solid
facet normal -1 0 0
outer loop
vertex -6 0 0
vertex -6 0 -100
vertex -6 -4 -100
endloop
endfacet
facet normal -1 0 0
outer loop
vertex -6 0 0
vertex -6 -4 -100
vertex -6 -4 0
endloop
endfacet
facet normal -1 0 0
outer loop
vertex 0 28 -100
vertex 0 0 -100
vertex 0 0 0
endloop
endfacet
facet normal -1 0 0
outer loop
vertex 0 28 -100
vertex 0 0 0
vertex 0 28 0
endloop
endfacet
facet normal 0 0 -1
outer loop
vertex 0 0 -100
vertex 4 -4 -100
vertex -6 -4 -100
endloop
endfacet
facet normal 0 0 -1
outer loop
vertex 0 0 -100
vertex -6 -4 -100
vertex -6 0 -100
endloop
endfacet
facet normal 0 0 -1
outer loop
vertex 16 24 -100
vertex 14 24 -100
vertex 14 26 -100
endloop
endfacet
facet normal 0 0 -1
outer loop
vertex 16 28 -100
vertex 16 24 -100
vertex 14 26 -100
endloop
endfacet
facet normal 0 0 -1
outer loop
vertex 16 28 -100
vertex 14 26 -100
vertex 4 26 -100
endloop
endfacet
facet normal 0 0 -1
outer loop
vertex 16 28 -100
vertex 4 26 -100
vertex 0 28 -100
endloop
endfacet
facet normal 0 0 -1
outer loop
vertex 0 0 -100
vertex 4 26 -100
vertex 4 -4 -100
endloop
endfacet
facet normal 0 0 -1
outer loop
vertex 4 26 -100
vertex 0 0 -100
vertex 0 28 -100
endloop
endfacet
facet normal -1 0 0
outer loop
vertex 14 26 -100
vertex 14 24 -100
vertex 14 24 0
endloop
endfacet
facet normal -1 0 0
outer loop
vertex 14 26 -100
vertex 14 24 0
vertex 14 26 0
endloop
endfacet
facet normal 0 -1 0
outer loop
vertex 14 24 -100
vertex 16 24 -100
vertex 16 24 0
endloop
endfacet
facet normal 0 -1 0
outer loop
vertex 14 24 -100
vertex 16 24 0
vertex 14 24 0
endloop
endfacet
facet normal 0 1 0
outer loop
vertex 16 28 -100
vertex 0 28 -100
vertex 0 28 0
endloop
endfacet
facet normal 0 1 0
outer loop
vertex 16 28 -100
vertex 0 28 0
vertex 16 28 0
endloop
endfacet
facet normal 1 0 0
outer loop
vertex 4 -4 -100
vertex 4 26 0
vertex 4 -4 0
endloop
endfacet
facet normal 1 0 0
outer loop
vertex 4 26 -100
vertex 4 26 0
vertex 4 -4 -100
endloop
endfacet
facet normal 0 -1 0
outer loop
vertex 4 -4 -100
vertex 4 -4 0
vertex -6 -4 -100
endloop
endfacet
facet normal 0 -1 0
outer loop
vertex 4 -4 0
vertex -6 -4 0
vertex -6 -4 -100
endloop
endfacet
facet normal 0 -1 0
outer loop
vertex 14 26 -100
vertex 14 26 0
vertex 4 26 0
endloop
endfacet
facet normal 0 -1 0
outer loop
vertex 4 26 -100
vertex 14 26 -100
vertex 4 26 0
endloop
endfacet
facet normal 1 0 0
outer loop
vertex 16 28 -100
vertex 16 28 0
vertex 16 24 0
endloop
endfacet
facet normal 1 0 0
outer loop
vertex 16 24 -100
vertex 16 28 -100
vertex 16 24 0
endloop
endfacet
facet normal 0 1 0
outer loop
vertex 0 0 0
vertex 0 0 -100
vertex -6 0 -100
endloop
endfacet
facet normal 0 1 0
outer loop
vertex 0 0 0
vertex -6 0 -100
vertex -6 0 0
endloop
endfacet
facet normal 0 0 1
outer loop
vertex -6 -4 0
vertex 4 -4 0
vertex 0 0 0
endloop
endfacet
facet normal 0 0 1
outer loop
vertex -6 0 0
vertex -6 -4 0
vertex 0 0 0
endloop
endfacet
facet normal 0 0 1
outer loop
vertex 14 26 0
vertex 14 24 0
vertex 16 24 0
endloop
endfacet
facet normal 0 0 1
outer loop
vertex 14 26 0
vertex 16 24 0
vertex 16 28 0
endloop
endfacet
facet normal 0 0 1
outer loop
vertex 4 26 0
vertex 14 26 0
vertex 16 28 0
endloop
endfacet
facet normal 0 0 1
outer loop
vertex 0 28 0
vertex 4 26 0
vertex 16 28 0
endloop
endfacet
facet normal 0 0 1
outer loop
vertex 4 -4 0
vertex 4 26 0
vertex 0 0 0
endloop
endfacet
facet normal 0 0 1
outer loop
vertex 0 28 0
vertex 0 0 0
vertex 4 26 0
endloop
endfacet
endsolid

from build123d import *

# Parameters (mm, degrees)
SKETCH1_W            = 100
SKETCH1_H            = 26
BOSS_EXTRUDE1_DEPTH  = 2
BOSS_EXTRUDE2_DEPTH  = 100
MOVE_START           = -100
MOVE_FACE1_OUTLINE_W = 2
MOVE_FACE1_OUTLINE_H = 28
MOVE_FACE1_DEPTH     = 100
SKETCH5_W            = 100
SKETCH5_H            = 4
BOSS_EXTRUDE3_DEPTH  = 6
SKETCH6_W            = 100
SKETCH6_H            = 4
BOSS_EXTRUDE4_DEPTH  = 4


# Read off the part's stored shape, not the designer's step: Move Face1
with BuildPart() as part:
    # Sketch1 → Boss-Extrude1 (new body)
    with BuildSketch(Plane(origin=(0, 0, 0), x_dir=(0, 0, -1), z_dir=(1, 0, 0))):
        with Locations((50, 13)):
            Rectangle(SKETCH1_W, SKETCH1_H)
    extrude(amount=BOSS_EXTRUDE1_DEPTH)

    # Sketch2 → Boss-Extrude2 (add)
    with BuildSketch(Plane.XY):
        Polygon((2, 26), (2, 28), (-12, 28), (-12, 24), (-10, 24), (-10, 26), align=None)
    extrude(amount=-BOSS_EXTRUDE2_DEPTH)


with BuildPart() as body_2:
    # Mirror1: mirrored copy
    add(part.part.mirror(Plane.ZY.offset(-2)))

    # Move Face1 outline → Move Face1 (add)
    with BuildSketch(Plane.XY.offset(MOVE_START)):
        with Locations((1, 14)):
            Rectangle(MOVE_FACE1_OUTLINE_W, MOVE_FACE1_OUTLINE_H)
    extrude(amount=MOVE_FACE1_DEPTH)



with BuildPart() as body_2_2:
    # Sketch5 → Boss-Extrude3 (new body)
    with BuildSketch(Plane.ZY):
        with Locations((-50, -2)):
            Rectangle(SKETCH5_W, SKETCH5_H)
    extrude(amount=BOSS_EXTRUDE3_DEPTH)


with BuildPart() as body_2_1:
    add(body_2.part)

    add(body_2_2.part)  # Boss-Extrude4 merges body 2 2
    # Sketch6 → Boss-Extrude4 (add)
    with BuildSketch(Plane(origin=(0, 0, 0), x_dir=(0, 0, -1), z_dir=(1, 0, 0))):
        with Locations((50, -2)):
            Rectangle(SKETCH6_W, SKETCH6_H)
    extrude(amount=BOSS_EXTRUDE4_DEPTH)


solid = body_2_1.part
